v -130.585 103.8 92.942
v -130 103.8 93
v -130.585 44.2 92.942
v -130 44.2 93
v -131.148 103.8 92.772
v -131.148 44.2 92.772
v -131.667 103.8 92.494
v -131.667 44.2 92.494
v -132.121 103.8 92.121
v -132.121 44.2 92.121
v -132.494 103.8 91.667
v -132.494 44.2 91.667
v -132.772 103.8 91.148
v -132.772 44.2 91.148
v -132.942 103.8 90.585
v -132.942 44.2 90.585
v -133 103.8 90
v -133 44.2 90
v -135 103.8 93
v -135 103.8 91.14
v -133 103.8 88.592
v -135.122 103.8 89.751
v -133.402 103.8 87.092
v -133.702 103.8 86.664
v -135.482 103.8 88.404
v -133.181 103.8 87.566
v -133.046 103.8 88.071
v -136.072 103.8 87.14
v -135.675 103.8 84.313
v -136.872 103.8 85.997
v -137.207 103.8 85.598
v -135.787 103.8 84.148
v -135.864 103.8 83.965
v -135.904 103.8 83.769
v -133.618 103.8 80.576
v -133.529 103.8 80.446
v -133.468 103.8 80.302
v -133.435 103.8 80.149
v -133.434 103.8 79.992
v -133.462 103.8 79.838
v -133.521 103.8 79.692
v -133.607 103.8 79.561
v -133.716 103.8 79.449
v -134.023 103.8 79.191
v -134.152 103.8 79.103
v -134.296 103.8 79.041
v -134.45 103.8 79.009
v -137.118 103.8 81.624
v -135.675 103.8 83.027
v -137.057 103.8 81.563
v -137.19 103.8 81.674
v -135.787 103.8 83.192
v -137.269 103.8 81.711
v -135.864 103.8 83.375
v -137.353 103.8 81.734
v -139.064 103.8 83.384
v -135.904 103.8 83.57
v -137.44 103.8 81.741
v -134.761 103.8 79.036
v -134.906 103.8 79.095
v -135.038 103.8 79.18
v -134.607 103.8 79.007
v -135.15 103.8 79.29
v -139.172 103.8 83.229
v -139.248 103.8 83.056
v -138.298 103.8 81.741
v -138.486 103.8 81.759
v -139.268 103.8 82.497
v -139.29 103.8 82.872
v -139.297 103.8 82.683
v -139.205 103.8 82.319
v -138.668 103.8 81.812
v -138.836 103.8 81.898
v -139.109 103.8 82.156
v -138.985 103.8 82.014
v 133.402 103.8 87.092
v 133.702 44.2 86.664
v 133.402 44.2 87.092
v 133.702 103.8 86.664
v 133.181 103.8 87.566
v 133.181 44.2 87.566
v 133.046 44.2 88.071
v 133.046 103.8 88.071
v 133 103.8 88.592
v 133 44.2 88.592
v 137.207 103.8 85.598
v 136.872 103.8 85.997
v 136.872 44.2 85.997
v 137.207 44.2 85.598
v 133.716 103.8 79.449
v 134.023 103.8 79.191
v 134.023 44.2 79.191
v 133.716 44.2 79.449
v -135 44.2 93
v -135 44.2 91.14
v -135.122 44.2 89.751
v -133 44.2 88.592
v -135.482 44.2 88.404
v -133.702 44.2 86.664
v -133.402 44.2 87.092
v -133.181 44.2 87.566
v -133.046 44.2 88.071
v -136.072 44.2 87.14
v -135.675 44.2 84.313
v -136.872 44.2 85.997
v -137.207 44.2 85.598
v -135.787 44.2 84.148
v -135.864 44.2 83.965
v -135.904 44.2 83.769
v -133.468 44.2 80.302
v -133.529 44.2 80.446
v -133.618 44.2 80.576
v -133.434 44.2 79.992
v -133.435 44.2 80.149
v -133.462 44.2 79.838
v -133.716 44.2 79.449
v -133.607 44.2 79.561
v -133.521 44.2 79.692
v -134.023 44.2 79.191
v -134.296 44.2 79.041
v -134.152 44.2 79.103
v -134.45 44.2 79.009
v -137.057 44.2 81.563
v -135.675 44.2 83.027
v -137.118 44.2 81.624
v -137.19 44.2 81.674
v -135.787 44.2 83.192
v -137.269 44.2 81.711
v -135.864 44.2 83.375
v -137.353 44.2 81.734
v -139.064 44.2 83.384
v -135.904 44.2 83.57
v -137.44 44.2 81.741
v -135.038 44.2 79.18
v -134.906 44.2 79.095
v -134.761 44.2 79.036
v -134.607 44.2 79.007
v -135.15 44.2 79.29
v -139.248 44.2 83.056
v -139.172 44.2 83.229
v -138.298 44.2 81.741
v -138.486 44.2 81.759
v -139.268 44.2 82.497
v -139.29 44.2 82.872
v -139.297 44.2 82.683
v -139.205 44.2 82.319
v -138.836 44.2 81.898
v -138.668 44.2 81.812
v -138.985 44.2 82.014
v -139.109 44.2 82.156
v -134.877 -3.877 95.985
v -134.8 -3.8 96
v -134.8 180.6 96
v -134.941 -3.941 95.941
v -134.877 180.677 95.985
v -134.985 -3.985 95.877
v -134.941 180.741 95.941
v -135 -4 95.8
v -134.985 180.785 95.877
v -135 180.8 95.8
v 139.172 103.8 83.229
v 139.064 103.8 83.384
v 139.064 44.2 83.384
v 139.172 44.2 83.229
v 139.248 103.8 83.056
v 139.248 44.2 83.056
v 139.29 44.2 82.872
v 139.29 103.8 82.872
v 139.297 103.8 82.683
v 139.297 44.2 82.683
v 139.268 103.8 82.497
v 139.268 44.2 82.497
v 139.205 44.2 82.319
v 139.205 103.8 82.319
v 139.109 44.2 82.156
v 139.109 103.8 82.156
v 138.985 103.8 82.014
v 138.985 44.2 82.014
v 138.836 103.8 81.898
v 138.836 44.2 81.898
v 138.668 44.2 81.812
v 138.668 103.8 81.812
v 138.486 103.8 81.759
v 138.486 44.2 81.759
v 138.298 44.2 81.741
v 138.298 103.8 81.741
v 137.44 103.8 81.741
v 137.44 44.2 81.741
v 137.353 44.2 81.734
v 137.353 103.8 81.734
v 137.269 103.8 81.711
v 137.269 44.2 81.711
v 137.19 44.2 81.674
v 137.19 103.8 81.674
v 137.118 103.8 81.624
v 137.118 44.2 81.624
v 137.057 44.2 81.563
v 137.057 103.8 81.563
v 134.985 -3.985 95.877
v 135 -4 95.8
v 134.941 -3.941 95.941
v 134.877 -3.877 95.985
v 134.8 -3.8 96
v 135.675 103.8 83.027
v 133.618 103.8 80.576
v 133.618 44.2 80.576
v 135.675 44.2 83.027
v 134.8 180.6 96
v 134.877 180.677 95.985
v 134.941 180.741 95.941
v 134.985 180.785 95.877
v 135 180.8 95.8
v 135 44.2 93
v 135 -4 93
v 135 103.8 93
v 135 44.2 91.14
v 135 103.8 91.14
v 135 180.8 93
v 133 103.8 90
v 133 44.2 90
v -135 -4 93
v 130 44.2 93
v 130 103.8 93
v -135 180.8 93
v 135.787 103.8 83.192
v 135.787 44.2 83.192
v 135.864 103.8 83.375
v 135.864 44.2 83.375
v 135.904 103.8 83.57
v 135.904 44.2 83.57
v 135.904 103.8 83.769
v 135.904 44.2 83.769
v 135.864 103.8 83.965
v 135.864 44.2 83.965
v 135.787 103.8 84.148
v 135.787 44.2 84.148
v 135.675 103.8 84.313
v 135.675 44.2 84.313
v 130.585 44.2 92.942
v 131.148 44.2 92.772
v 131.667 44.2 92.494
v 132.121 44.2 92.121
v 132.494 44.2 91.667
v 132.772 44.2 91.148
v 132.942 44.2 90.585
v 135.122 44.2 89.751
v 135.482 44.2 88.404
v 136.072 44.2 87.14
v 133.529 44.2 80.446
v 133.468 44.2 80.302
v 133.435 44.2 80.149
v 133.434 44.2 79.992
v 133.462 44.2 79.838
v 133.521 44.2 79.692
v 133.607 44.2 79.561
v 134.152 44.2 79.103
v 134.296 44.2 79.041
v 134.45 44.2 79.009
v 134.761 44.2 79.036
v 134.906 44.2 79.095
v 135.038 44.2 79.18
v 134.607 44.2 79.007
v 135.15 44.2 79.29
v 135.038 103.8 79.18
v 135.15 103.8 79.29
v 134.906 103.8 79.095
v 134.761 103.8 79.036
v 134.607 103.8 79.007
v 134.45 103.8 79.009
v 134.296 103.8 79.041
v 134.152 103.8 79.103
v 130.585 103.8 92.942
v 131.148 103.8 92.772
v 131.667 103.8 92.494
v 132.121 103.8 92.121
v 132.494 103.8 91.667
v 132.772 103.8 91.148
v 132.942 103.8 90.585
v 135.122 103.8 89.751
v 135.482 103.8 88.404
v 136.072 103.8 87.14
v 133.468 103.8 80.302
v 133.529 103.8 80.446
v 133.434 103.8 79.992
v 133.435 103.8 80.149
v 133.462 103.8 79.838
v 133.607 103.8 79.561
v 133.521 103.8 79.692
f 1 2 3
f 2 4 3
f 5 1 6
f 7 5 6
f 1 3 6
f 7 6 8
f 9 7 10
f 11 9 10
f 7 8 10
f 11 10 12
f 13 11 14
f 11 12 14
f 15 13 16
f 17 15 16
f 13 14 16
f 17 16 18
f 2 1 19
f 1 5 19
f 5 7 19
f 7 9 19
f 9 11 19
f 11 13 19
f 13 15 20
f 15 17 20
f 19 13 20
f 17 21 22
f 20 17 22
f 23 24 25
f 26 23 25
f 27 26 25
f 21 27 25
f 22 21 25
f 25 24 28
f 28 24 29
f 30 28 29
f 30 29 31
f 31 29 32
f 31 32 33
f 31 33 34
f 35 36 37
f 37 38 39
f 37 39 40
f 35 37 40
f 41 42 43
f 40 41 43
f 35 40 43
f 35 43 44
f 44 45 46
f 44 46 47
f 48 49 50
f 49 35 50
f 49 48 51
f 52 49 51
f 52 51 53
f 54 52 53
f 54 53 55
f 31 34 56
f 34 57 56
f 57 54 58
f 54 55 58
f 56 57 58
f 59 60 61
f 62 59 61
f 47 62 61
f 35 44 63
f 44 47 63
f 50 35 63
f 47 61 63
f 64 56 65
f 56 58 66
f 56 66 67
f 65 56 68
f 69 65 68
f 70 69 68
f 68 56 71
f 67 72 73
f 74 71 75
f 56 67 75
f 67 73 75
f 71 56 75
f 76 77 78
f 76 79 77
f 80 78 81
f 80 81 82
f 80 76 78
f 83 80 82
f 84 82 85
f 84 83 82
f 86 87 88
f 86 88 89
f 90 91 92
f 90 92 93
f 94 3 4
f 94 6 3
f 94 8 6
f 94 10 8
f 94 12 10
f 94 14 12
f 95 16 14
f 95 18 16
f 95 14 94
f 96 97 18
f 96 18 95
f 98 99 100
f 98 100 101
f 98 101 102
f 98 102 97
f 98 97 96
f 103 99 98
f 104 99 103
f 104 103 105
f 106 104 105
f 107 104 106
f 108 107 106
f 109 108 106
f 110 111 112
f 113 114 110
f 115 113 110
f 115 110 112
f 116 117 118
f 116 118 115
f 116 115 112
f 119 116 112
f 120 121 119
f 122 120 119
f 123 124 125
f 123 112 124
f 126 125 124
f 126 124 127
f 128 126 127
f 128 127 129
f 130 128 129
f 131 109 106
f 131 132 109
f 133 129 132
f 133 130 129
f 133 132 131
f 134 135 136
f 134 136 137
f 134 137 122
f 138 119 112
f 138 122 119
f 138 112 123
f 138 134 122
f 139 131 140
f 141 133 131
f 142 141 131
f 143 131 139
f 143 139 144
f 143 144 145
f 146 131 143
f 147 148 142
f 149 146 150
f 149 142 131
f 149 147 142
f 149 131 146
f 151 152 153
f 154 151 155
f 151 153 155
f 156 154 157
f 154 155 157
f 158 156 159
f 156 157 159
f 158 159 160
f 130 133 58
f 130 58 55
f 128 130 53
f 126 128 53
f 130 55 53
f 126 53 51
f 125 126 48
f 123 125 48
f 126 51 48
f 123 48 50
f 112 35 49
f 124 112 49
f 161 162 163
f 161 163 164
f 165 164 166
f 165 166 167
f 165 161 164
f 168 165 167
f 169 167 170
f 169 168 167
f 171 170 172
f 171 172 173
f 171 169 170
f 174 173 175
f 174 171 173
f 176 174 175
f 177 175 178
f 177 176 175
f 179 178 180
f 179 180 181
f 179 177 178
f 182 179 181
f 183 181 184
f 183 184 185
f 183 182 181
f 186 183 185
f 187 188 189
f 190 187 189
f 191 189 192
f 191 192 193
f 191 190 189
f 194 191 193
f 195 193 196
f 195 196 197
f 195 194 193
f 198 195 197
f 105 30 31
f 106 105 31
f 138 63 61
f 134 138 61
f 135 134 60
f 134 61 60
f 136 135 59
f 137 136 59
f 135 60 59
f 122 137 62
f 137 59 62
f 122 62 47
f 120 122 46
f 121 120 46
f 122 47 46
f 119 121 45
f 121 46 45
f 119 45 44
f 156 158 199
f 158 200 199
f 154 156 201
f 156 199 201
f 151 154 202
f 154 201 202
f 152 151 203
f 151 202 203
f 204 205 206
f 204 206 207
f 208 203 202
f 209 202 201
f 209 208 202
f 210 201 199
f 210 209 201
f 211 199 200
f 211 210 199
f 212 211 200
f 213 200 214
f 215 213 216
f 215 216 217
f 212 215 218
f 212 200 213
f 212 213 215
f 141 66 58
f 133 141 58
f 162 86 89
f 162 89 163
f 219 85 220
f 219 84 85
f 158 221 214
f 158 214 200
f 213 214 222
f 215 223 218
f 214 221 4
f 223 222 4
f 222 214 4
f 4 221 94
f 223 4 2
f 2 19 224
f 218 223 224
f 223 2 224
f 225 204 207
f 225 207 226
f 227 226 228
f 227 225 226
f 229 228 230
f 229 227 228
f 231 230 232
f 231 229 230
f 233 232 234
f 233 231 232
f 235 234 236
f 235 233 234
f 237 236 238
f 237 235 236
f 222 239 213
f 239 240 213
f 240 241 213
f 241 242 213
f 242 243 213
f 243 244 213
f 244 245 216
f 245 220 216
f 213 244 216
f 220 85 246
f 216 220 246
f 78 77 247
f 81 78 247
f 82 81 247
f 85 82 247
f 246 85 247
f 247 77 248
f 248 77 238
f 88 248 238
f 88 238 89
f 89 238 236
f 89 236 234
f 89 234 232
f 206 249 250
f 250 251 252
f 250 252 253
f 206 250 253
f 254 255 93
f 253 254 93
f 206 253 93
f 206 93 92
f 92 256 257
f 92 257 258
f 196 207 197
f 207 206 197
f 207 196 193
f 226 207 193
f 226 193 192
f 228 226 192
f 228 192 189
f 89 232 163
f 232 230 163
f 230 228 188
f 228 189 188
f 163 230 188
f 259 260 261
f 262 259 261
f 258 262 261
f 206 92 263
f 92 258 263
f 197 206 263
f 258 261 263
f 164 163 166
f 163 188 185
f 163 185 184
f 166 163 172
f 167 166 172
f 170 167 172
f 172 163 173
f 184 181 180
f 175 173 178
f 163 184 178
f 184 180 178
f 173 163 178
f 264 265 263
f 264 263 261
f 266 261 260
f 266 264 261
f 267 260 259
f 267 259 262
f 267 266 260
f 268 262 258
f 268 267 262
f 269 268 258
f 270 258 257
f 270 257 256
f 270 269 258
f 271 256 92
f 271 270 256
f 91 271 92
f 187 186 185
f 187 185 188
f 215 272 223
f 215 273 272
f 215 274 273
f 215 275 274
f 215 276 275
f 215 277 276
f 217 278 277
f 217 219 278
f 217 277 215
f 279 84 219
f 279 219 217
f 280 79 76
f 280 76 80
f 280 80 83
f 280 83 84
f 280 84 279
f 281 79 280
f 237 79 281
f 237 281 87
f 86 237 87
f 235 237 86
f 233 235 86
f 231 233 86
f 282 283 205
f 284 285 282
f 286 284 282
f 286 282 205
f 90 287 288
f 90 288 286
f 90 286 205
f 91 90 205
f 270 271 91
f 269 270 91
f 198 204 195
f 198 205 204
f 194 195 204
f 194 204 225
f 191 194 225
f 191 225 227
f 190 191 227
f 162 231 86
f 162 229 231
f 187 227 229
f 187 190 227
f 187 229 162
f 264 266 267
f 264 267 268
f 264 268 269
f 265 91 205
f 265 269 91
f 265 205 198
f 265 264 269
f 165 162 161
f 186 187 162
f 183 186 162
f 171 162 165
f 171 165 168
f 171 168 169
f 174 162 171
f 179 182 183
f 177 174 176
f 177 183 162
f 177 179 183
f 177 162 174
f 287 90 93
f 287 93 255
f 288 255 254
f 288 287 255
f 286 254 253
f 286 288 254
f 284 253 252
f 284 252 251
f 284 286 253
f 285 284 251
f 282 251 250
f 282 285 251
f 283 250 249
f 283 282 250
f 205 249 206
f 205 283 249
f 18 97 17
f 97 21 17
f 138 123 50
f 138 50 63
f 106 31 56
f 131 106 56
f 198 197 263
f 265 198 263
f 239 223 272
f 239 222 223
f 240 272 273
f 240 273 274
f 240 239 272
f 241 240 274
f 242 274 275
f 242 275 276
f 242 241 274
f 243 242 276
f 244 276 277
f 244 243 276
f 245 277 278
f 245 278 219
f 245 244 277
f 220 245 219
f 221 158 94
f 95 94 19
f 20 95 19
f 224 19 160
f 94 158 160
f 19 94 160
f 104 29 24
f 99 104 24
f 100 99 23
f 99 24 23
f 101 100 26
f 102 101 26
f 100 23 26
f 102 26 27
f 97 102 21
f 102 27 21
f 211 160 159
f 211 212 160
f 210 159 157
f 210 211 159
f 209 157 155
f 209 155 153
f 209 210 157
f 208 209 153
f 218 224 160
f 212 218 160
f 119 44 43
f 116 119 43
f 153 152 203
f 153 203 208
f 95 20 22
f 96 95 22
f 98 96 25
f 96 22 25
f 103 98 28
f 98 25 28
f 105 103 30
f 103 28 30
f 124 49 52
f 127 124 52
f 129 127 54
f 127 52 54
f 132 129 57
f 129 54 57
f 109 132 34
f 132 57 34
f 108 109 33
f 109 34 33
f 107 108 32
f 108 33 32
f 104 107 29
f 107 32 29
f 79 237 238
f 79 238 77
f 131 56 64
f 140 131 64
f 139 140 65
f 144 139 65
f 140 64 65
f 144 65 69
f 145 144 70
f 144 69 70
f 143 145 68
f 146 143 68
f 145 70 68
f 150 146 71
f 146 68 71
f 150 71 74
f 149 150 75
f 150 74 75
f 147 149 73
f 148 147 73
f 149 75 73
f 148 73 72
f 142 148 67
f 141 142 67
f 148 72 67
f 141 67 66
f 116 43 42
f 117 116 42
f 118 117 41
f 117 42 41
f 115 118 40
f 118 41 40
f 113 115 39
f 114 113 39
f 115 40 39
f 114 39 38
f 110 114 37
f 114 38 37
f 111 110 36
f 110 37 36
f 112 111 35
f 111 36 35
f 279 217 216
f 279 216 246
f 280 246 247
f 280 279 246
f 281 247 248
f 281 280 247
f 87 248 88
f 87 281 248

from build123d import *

# Parameters (mm, degrees)
STOCK_OUTTER_CASE_1_START     = -135
STOCK_OUTTER_CASE_1_OUTLINE_W = 184.8
STOCK_OUTTER_CASE_1_OUTLINE_H = 3
STOCK_OUTTER_CASE_1_DEPTH     = 270
FILLET1_R                     = 0.2
BOSS_EXTRUDE1_DEPTH           = 29.8
FILLET2_R                     = 3
FILLET2_OF_MIRROR1_R          = 3
BOSS_EXTRUDE2_DEPTH           = 59.6
FILLET3_R                     = 0.5


# Read off the part's stored shape, not the designer's step: Stock-outter_case-1
with BuildPart() as part:
    # Stock-outter_case-1 outline → Stock-outter_case-1 (new body)
    with BuildSketch(Plane.YZ.offset(STOCK_OUTTER_CASE_1_START)):
        with Locations((88.4, 94.5)):
            Rectangle(STOCK_OUTTER_CASE_1_OUTLINE_W, STOCK_OUTTER_CASE_1_OUTLINE_H)
    extrude(amount=STOCK_OUTTER_CASE_1_DEPTH)

    # Fillet1
    fillet1_edges = [part.edges().sort_by_distance(p)[0] for p in [
        (0, 180.8, 96),
        (0, -4, 96),
        (135, 88.4, 96),
        (-135, 88.4, 96),
    ]]
    fillet(fillet1_edges, radius=FILLET1_R)

    # Sketch2 → Boss-Extrude1 (add, symmetric)
    with BuildSketch(Plane(origin=(0, 74, 0), x_dir=(1, 0, 0), z_dir=(0, 1, 0))):
        with BuildLine():
            Line((133, -93), (135, -93))
            Line((135, -93), (135, -91.139702343))
            ThreePointArc((135, -91.139702343), (135.482459034, -88.403541196), (136.871644455, -85.997401465))
            Line((136.871644455, -85.997401465), (137.206664088, -85.598140613))
            ThreePointArc((137.206664088, -85.598140613), (137.908530759, -83.669777784), (137.206664088, -81.741414955))
            Line((137.206664088, -81.741414955), (135.149743737, -79.290072737))
            ThreePointArc((135.149743737, -79.290072737), (134.606632777, -79.007347067), (134.022678095, -79.191467271))
            Line((134.022678095, -79.191467271), (133.716260318, -79.448582314))
            ThreePointArc((133.716260318, -79.448582314), (133.433534647, -79.991693275), (133.617654851, -80.575647957))
            Line((133.617654851, -80.575647957), (135.674575202, -83.026990175))
            ThreePointArc((135.674575202, -83.026990175), (135.908530759, -83.669777784), (135.674575202, -84.312565394))
            Line((135.674575202, -84.312565394), (133.701866671, -86.663547874))
            ThreePointArc((133.701866671, -86.663547874), (133.180922138, -87.565850273), (133, -88.591910703))
            Line((133, -88.591910703), (133, -93))
        make_face()
    boss_extrude1 = extrude(amount=BOSS_EXTRUDE1_DEPTH, both=True)

    # Fillet2
    fillet2_edges = [part.edges().sort_by_distance(p)[0] for p in [
        (133, 74, 93),
    ]]
    fillet(fillet2_edges, radius=FILLET2_R)

    # Mirror1: Boss-Extrude1 across plane
    add(boss_extrude1.mirror(Plane(origin=(0, 0, 0), x_dir=(0, 0, 1), z_dir=(1, 0, 0))))

    # Fillet2 of Mirror1
    fillet2_of_mirror1_edges = [part.edges().sort_by_distance(p)[0] for p in [
        (-133, 74, 93),
    ]]
    fillet(fillet2_of_mirror1_edges, radius=FILLET2_OF_MIRROR1_R)

    # Sketch3 → Boss-Extrude2 (add)
    with BuildSketch(Plane(origin=(0, 103.8, 0), x_dir=(1, 0, 0), z_dir=(0, 1, 0))):
        with BuildLine():
            Line((137.206664088, -85.598140613), (139.064378688, -83.384202565))
            ThreePointArc((139.064378688, -83.384202565), (139.204642032, -82.318796694), (138.298334245, -81.741414955))
            Line((138.298334245, -81.741414955), (137.206664088, -81.741414955))
            Line((137.206664088, -81.741414955), (137.206664088, -85.598140613))
        make_face()
    boss_extrude2 = extrude(amount=-BOSS_EXTRUDE2_DEPTH)

    # Mirror2: Boss-Extrude2 across plane
    add(boss_extrude2.mirror(Plane(origin=(0, 0, 0), x_dir=(0, 0, 1), z_dir=(1, 0, 0))))

    # Fillet3
    fillet3_edges = [part.edges().sort_by_distance(p)[0] for p in [
        (137.206664088, 74, 81.741414955),
        (-137.206664088, 74, 81.741414955),
    ]]
    fillet(fillet3_edges, radius=FILLET3_R)


solid = part.part
